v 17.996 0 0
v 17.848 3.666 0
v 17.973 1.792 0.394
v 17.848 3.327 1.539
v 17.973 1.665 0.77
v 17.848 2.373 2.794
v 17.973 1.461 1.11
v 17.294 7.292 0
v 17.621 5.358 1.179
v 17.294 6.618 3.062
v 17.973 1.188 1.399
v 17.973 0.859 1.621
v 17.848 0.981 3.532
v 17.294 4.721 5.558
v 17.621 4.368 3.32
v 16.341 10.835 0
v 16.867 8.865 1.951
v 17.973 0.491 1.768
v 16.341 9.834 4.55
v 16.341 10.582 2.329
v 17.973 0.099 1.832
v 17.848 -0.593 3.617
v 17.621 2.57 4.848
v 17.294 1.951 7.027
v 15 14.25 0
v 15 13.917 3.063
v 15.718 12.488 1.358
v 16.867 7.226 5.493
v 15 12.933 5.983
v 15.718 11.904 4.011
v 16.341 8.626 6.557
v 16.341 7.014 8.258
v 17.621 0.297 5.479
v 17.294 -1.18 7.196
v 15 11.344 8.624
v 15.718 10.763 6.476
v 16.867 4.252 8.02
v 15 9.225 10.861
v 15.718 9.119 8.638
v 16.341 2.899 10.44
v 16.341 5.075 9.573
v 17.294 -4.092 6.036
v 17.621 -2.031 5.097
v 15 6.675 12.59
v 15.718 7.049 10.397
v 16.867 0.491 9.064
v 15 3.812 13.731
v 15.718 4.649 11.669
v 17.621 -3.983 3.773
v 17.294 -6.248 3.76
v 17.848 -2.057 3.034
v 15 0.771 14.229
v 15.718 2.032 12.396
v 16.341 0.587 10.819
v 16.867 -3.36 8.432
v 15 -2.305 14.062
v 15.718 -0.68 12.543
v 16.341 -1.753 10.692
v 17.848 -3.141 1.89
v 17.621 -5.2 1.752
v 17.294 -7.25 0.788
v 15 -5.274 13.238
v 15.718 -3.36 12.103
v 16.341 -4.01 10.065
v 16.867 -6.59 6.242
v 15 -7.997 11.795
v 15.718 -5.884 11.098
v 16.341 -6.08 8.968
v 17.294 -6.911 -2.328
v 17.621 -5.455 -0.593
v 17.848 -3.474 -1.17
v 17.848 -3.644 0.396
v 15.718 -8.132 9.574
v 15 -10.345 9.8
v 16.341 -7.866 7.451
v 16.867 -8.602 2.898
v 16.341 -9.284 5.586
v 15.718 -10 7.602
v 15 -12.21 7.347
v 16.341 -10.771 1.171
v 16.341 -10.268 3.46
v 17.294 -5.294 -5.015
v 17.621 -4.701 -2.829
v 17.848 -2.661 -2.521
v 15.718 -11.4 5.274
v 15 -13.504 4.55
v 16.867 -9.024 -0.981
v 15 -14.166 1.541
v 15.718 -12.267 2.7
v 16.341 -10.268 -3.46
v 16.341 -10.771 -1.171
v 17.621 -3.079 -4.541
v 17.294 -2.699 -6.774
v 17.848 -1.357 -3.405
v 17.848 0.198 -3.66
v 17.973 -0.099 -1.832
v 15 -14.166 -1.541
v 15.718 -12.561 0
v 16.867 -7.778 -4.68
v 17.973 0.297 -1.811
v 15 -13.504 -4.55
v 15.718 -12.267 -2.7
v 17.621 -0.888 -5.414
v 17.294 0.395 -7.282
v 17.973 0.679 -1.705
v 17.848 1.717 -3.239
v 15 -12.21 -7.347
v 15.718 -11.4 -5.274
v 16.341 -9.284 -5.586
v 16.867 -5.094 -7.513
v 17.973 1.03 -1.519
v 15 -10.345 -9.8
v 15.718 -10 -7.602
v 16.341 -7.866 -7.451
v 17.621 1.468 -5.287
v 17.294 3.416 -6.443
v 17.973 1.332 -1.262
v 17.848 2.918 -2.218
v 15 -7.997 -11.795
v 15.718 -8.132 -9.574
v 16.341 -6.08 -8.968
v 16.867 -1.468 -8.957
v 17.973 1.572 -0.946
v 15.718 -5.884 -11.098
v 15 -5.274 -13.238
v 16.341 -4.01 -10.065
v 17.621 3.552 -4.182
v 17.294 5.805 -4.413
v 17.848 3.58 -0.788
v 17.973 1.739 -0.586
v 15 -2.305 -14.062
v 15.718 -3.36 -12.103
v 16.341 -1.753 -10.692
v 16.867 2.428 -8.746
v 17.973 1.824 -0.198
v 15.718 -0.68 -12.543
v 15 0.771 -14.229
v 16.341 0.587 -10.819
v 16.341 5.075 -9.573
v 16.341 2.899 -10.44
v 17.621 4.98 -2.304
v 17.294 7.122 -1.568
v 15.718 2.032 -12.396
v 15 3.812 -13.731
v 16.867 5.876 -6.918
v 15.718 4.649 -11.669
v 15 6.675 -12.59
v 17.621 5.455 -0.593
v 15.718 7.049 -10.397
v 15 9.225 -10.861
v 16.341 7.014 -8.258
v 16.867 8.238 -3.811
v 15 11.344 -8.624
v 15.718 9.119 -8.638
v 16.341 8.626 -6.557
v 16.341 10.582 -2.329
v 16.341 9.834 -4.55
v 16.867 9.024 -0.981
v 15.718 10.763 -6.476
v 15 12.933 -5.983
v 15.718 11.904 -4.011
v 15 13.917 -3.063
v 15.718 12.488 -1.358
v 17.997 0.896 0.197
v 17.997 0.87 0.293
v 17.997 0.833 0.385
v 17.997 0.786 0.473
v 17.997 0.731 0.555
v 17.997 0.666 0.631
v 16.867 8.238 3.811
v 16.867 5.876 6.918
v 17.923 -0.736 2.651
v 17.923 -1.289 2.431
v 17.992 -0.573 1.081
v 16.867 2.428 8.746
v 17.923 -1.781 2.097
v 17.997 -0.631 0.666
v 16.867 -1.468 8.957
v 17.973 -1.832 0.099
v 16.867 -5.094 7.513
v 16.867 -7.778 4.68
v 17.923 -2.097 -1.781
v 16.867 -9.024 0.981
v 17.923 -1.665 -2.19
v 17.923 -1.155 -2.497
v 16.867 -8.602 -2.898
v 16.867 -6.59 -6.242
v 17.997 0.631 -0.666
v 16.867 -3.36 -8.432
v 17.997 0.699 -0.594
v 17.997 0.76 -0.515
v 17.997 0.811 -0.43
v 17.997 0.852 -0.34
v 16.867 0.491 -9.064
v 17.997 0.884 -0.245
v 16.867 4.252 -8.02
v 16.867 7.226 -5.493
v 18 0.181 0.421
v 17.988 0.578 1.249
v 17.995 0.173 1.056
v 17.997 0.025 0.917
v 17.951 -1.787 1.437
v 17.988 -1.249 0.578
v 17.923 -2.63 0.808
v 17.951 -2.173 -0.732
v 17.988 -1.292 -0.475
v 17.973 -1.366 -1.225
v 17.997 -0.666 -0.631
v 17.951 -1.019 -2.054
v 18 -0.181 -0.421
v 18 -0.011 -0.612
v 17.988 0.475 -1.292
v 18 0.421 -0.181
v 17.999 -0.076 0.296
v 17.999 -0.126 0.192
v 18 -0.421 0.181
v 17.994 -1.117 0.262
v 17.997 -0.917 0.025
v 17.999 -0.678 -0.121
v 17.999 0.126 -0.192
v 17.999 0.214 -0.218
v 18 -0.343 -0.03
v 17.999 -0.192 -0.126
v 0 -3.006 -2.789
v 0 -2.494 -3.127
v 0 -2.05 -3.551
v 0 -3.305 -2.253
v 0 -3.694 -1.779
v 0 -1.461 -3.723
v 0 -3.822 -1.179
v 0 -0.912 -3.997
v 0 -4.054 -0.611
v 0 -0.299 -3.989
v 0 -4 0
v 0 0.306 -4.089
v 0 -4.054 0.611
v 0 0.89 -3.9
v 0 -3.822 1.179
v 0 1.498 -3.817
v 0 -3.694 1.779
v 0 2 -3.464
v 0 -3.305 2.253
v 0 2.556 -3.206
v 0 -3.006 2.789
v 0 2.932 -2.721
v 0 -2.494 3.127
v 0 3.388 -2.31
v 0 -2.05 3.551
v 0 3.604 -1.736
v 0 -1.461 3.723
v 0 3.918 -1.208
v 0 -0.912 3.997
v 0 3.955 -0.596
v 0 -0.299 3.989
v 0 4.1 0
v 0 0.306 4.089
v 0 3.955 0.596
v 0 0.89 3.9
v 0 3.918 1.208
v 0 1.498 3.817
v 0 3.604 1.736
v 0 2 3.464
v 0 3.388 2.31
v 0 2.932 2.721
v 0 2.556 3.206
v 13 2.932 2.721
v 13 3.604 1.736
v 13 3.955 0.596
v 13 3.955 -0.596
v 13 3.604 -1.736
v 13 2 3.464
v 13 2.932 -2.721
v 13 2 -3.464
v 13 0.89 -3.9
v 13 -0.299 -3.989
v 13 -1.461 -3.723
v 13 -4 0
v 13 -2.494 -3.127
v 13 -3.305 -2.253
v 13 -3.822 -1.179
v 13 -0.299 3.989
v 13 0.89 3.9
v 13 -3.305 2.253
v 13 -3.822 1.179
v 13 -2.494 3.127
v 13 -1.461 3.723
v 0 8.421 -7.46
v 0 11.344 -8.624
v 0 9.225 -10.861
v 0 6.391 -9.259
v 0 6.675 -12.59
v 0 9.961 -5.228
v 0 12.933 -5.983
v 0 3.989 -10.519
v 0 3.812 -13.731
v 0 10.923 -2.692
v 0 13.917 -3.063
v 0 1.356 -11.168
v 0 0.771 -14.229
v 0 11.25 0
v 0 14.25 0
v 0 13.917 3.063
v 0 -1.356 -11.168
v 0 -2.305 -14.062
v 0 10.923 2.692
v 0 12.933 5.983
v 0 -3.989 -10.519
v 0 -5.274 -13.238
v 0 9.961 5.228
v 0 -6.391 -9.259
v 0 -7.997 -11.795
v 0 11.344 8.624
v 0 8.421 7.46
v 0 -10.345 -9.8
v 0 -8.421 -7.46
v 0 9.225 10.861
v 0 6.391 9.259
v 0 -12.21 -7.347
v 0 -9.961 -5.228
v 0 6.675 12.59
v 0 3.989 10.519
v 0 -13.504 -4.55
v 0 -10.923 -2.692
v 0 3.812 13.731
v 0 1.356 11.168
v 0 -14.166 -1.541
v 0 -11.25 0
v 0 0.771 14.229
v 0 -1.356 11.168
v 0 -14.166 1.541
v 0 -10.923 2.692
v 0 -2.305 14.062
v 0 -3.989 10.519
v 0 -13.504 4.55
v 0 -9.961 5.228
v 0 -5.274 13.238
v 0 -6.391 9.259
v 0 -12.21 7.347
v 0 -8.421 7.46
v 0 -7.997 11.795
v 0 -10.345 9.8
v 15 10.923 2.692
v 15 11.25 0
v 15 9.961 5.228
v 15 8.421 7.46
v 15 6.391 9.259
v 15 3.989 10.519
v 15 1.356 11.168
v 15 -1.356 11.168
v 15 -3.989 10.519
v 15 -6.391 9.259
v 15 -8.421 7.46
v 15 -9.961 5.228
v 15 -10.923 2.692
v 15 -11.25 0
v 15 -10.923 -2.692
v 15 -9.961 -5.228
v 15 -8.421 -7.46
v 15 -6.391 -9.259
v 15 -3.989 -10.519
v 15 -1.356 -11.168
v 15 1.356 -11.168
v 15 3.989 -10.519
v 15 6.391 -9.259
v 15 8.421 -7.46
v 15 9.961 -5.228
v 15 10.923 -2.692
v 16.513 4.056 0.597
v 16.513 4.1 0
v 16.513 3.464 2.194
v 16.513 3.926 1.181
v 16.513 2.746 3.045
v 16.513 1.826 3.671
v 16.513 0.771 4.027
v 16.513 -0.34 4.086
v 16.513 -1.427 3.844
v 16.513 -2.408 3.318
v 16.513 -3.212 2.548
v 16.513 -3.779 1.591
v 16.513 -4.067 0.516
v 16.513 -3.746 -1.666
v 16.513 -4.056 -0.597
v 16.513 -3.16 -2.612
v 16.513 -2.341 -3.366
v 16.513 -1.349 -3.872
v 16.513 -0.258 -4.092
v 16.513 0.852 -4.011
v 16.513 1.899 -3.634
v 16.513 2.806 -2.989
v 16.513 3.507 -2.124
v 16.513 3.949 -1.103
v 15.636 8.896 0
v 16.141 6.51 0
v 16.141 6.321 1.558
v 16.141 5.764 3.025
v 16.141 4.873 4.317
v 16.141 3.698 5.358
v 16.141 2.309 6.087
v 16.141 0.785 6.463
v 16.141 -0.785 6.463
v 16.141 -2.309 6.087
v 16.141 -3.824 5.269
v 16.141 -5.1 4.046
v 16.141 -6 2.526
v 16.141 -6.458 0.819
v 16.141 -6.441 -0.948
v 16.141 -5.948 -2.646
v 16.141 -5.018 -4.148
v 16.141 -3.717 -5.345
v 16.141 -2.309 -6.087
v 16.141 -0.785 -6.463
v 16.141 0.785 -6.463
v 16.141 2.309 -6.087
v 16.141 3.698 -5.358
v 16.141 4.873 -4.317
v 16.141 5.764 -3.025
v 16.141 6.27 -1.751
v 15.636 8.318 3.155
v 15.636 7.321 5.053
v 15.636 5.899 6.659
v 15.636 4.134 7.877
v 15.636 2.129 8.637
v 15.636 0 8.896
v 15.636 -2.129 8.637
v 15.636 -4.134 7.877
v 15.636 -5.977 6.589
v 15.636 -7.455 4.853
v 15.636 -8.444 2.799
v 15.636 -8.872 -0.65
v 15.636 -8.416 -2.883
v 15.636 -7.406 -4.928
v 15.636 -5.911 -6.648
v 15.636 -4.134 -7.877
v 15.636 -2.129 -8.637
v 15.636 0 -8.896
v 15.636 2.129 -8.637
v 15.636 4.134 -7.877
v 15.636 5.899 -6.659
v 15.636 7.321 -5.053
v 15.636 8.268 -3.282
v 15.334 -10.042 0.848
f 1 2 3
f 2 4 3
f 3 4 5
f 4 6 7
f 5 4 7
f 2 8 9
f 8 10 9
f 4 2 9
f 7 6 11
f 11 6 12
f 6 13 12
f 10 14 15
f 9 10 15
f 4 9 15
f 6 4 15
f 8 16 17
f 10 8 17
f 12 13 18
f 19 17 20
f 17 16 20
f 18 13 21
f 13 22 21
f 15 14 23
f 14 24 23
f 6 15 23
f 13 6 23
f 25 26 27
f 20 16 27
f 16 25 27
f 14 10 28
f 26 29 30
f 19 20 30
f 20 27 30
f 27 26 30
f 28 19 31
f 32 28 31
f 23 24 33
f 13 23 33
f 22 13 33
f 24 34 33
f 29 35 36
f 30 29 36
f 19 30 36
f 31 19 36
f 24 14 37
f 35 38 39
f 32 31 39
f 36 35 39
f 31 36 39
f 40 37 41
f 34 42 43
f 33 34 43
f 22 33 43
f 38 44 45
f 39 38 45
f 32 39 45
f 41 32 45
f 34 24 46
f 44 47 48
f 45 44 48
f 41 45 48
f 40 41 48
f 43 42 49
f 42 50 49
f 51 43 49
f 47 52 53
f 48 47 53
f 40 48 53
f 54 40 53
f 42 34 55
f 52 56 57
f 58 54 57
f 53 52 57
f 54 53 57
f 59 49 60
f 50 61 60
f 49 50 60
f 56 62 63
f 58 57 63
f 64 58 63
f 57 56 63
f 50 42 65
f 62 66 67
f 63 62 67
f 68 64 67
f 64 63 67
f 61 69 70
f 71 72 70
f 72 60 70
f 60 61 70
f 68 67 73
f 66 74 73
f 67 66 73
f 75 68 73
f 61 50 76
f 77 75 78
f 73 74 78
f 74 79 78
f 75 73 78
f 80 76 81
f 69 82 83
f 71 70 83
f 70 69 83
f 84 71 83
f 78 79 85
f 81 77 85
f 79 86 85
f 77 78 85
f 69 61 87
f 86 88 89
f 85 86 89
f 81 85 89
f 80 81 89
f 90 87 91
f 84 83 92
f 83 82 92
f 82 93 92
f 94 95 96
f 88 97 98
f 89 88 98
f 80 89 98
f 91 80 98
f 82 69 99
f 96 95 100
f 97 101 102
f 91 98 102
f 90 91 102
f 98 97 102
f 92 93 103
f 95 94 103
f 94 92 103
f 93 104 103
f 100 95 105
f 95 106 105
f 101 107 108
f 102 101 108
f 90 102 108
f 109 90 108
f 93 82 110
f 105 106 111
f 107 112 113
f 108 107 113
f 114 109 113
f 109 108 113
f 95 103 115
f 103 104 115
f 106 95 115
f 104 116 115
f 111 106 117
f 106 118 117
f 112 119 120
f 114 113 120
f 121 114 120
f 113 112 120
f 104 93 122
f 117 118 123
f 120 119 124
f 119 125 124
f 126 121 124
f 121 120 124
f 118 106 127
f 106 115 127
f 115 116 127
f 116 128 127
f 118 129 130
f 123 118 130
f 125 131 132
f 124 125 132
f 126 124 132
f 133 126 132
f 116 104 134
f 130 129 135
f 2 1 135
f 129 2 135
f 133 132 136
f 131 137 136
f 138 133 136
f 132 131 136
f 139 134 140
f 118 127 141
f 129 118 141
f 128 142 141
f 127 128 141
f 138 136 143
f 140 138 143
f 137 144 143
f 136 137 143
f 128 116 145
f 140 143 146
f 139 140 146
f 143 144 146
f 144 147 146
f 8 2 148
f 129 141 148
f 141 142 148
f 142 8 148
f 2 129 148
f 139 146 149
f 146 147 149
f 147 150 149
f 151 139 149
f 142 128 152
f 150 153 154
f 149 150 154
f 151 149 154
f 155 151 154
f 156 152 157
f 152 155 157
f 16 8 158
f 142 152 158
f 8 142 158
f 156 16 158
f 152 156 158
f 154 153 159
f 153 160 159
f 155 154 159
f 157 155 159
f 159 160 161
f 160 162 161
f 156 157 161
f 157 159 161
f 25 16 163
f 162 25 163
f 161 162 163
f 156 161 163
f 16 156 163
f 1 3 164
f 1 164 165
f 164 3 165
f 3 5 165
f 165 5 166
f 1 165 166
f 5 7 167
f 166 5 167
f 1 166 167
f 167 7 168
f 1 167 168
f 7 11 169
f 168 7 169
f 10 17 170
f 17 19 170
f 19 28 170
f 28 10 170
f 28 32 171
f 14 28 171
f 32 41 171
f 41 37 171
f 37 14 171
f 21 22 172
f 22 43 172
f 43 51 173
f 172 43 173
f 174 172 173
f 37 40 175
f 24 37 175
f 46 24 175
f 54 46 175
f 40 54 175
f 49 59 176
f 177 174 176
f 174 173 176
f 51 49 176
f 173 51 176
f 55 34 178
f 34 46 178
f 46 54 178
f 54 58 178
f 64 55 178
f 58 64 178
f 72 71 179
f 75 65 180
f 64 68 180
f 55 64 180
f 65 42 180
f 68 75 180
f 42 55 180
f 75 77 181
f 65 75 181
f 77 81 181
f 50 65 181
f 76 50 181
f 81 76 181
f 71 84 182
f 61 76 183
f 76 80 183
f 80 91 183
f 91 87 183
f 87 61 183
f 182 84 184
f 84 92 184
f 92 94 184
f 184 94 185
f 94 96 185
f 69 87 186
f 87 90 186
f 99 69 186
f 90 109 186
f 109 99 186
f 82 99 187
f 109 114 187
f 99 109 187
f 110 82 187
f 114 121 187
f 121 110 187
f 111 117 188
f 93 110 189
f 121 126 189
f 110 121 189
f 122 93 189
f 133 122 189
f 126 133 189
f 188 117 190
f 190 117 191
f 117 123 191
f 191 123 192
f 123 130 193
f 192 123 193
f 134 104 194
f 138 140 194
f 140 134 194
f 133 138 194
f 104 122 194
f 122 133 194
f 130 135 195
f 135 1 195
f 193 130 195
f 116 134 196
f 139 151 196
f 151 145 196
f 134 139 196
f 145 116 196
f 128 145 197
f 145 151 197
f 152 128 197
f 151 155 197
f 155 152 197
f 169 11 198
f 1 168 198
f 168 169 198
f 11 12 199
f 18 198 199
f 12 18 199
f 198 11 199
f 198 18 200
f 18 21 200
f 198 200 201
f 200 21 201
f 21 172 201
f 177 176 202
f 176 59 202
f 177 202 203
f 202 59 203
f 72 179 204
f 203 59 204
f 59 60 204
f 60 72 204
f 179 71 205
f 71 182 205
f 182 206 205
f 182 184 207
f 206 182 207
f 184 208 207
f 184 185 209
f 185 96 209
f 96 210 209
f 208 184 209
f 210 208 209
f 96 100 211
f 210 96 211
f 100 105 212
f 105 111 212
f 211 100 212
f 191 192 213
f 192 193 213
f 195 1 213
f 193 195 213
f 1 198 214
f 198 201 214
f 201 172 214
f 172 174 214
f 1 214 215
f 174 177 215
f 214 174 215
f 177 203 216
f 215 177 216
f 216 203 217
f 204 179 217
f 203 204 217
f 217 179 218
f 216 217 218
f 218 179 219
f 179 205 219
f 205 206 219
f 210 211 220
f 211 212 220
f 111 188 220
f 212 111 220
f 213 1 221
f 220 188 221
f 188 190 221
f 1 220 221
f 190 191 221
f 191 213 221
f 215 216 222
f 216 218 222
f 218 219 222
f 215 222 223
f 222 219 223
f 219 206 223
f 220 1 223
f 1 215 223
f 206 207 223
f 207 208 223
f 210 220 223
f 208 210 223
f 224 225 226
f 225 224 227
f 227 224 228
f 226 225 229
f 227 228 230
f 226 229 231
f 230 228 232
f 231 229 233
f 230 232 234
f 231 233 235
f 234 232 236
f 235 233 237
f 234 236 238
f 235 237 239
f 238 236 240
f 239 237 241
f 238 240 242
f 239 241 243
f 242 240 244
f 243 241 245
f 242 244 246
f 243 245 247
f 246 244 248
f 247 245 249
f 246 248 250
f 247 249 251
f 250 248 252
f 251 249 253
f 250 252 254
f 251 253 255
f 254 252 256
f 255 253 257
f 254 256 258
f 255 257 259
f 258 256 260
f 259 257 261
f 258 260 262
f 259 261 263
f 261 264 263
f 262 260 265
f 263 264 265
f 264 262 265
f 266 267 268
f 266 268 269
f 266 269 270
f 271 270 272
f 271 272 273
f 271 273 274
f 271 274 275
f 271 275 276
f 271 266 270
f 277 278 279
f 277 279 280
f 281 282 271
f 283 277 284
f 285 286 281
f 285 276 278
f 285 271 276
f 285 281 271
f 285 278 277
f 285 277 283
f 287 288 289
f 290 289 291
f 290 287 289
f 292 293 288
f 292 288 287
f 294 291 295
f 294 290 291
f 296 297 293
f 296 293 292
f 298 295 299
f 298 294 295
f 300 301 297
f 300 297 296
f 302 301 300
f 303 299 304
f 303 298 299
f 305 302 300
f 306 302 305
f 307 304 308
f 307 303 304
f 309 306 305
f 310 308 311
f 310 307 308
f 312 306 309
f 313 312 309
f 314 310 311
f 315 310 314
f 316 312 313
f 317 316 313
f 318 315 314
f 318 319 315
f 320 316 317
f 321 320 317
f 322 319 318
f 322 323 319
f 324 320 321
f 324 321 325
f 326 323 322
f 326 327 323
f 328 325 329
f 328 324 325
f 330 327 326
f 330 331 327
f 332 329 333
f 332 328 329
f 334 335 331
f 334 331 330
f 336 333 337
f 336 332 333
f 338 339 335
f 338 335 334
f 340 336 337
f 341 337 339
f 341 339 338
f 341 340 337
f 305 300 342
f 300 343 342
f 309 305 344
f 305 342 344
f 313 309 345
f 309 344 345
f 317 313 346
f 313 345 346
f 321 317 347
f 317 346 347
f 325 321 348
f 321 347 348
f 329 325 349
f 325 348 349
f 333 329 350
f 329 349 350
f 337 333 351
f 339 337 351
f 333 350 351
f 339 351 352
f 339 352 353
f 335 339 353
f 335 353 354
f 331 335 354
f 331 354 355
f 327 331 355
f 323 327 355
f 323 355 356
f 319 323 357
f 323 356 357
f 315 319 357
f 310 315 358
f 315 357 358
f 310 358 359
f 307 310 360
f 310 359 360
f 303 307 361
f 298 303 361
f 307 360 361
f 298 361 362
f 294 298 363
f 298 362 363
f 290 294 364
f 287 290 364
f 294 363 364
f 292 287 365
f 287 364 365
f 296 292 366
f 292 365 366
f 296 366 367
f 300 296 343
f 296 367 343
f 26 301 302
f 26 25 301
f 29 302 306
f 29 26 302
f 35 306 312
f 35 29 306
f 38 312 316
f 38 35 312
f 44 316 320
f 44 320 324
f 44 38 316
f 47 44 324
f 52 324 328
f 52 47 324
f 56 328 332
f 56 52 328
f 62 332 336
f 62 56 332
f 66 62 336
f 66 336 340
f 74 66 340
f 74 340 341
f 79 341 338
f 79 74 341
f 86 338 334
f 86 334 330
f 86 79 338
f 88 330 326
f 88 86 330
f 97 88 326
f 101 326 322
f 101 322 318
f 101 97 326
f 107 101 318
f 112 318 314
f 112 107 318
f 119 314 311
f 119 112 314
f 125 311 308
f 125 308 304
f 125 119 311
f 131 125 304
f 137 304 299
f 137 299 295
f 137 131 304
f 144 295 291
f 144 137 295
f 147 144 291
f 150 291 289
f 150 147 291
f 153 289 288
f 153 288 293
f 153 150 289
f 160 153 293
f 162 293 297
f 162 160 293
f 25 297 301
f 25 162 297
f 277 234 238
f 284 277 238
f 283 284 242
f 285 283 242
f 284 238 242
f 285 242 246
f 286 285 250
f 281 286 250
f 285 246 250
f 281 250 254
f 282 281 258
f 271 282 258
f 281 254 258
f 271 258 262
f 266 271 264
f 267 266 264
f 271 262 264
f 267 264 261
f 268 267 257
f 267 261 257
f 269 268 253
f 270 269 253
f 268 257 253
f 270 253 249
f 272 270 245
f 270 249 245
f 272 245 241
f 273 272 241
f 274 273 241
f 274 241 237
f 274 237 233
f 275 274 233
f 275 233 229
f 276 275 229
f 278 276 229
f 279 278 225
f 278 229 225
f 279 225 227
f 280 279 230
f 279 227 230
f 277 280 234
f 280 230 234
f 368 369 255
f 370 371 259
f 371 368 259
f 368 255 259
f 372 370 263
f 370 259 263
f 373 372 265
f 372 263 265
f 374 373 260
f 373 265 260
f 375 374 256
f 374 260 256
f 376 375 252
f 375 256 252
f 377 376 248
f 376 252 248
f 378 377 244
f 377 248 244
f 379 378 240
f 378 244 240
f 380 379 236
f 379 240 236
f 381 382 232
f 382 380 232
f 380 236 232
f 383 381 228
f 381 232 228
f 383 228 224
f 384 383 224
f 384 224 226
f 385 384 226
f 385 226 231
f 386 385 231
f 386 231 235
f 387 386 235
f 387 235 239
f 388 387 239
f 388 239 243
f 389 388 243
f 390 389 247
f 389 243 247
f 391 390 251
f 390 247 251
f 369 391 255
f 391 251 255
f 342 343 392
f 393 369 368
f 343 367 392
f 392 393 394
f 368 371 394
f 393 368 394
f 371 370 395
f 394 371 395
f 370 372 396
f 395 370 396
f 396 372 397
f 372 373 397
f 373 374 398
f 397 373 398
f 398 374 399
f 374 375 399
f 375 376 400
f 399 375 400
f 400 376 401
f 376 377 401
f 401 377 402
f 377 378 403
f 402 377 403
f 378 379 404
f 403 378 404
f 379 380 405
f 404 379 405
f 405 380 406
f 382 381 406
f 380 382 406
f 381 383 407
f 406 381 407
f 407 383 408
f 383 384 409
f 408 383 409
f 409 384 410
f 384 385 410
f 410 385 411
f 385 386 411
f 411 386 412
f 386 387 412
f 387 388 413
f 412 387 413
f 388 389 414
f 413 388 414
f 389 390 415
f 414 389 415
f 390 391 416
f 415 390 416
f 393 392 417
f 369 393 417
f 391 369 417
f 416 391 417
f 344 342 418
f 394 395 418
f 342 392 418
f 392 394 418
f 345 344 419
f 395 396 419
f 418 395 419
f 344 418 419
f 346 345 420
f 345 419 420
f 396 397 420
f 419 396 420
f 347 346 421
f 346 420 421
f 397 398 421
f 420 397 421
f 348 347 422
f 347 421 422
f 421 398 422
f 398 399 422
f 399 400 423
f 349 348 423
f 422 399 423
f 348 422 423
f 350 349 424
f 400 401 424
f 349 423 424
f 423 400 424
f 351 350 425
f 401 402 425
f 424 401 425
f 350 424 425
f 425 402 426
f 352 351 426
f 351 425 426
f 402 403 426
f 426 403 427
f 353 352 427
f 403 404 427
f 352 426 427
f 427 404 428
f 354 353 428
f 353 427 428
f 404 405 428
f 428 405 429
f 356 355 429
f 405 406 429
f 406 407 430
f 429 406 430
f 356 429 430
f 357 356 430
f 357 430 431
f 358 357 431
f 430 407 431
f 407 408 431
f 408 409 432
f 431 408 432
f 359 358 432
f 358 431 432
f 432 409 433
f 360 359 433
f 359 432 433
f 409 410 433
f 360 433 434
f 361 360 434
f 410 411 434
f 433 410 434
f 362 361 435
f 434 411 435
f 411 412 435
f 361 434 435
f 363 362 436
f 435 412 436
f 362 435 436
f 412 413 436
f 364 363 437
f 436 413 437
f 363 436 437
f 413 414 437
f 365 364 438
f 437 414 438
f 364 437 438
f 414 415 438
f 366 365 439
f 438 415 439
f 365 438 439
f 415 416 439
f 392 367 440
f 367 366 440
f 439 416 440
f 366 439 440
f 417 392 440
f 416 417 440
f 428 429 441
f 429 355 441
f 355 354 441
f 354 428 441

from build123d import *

# Parameters (mm, degrees)
F0_W     = 15
F0_H     = 3
F2_R     = 4.1
F4_R     = 4
F5_DEPTH = 13


with BuildPart() as f1:
    # F0 (on Top) → F1 (revolve)
    with BuildSketch(Plane.XY):
        with BuildLine():
            Line((15, 14.25), (15, 11.25))
            ThreePointArc((15, 11.25), (16.2836091475, 5.6846908501), (16.8355224703, 0))
            Line((16.8355224703, 0), (17.9961773834, 0))
            ThreePointArc((17.9961773834, 0), (17.2938882179, 7.2923232661), (15, 14.25))
        make_face()
        with Locations((7.5, 12.75)):
            Rectangle(F0_W, F0_H)
    revolve(axis=Axis((8.9980886917, 0, 0), (1, 0, 0)))

    # F2 (on Right) → F3 (join, up to the next surface of F1)
    with BuildSketch(Plane.YZ):
        Circle(F2_R)
    extrude(until=Until.NEXT)

    # F4 (on face) → F5 (cut)
    with BuildSketch(Plane(origin=(0, 0, 0), x_dir=(0, -1, 0), z_dir=(-1, 0, 0))):
        Circle(F4_R)
    extrude(amount=-F5_DEPTH, mode=Mode.SUBTRACT)


solid = f1.part
